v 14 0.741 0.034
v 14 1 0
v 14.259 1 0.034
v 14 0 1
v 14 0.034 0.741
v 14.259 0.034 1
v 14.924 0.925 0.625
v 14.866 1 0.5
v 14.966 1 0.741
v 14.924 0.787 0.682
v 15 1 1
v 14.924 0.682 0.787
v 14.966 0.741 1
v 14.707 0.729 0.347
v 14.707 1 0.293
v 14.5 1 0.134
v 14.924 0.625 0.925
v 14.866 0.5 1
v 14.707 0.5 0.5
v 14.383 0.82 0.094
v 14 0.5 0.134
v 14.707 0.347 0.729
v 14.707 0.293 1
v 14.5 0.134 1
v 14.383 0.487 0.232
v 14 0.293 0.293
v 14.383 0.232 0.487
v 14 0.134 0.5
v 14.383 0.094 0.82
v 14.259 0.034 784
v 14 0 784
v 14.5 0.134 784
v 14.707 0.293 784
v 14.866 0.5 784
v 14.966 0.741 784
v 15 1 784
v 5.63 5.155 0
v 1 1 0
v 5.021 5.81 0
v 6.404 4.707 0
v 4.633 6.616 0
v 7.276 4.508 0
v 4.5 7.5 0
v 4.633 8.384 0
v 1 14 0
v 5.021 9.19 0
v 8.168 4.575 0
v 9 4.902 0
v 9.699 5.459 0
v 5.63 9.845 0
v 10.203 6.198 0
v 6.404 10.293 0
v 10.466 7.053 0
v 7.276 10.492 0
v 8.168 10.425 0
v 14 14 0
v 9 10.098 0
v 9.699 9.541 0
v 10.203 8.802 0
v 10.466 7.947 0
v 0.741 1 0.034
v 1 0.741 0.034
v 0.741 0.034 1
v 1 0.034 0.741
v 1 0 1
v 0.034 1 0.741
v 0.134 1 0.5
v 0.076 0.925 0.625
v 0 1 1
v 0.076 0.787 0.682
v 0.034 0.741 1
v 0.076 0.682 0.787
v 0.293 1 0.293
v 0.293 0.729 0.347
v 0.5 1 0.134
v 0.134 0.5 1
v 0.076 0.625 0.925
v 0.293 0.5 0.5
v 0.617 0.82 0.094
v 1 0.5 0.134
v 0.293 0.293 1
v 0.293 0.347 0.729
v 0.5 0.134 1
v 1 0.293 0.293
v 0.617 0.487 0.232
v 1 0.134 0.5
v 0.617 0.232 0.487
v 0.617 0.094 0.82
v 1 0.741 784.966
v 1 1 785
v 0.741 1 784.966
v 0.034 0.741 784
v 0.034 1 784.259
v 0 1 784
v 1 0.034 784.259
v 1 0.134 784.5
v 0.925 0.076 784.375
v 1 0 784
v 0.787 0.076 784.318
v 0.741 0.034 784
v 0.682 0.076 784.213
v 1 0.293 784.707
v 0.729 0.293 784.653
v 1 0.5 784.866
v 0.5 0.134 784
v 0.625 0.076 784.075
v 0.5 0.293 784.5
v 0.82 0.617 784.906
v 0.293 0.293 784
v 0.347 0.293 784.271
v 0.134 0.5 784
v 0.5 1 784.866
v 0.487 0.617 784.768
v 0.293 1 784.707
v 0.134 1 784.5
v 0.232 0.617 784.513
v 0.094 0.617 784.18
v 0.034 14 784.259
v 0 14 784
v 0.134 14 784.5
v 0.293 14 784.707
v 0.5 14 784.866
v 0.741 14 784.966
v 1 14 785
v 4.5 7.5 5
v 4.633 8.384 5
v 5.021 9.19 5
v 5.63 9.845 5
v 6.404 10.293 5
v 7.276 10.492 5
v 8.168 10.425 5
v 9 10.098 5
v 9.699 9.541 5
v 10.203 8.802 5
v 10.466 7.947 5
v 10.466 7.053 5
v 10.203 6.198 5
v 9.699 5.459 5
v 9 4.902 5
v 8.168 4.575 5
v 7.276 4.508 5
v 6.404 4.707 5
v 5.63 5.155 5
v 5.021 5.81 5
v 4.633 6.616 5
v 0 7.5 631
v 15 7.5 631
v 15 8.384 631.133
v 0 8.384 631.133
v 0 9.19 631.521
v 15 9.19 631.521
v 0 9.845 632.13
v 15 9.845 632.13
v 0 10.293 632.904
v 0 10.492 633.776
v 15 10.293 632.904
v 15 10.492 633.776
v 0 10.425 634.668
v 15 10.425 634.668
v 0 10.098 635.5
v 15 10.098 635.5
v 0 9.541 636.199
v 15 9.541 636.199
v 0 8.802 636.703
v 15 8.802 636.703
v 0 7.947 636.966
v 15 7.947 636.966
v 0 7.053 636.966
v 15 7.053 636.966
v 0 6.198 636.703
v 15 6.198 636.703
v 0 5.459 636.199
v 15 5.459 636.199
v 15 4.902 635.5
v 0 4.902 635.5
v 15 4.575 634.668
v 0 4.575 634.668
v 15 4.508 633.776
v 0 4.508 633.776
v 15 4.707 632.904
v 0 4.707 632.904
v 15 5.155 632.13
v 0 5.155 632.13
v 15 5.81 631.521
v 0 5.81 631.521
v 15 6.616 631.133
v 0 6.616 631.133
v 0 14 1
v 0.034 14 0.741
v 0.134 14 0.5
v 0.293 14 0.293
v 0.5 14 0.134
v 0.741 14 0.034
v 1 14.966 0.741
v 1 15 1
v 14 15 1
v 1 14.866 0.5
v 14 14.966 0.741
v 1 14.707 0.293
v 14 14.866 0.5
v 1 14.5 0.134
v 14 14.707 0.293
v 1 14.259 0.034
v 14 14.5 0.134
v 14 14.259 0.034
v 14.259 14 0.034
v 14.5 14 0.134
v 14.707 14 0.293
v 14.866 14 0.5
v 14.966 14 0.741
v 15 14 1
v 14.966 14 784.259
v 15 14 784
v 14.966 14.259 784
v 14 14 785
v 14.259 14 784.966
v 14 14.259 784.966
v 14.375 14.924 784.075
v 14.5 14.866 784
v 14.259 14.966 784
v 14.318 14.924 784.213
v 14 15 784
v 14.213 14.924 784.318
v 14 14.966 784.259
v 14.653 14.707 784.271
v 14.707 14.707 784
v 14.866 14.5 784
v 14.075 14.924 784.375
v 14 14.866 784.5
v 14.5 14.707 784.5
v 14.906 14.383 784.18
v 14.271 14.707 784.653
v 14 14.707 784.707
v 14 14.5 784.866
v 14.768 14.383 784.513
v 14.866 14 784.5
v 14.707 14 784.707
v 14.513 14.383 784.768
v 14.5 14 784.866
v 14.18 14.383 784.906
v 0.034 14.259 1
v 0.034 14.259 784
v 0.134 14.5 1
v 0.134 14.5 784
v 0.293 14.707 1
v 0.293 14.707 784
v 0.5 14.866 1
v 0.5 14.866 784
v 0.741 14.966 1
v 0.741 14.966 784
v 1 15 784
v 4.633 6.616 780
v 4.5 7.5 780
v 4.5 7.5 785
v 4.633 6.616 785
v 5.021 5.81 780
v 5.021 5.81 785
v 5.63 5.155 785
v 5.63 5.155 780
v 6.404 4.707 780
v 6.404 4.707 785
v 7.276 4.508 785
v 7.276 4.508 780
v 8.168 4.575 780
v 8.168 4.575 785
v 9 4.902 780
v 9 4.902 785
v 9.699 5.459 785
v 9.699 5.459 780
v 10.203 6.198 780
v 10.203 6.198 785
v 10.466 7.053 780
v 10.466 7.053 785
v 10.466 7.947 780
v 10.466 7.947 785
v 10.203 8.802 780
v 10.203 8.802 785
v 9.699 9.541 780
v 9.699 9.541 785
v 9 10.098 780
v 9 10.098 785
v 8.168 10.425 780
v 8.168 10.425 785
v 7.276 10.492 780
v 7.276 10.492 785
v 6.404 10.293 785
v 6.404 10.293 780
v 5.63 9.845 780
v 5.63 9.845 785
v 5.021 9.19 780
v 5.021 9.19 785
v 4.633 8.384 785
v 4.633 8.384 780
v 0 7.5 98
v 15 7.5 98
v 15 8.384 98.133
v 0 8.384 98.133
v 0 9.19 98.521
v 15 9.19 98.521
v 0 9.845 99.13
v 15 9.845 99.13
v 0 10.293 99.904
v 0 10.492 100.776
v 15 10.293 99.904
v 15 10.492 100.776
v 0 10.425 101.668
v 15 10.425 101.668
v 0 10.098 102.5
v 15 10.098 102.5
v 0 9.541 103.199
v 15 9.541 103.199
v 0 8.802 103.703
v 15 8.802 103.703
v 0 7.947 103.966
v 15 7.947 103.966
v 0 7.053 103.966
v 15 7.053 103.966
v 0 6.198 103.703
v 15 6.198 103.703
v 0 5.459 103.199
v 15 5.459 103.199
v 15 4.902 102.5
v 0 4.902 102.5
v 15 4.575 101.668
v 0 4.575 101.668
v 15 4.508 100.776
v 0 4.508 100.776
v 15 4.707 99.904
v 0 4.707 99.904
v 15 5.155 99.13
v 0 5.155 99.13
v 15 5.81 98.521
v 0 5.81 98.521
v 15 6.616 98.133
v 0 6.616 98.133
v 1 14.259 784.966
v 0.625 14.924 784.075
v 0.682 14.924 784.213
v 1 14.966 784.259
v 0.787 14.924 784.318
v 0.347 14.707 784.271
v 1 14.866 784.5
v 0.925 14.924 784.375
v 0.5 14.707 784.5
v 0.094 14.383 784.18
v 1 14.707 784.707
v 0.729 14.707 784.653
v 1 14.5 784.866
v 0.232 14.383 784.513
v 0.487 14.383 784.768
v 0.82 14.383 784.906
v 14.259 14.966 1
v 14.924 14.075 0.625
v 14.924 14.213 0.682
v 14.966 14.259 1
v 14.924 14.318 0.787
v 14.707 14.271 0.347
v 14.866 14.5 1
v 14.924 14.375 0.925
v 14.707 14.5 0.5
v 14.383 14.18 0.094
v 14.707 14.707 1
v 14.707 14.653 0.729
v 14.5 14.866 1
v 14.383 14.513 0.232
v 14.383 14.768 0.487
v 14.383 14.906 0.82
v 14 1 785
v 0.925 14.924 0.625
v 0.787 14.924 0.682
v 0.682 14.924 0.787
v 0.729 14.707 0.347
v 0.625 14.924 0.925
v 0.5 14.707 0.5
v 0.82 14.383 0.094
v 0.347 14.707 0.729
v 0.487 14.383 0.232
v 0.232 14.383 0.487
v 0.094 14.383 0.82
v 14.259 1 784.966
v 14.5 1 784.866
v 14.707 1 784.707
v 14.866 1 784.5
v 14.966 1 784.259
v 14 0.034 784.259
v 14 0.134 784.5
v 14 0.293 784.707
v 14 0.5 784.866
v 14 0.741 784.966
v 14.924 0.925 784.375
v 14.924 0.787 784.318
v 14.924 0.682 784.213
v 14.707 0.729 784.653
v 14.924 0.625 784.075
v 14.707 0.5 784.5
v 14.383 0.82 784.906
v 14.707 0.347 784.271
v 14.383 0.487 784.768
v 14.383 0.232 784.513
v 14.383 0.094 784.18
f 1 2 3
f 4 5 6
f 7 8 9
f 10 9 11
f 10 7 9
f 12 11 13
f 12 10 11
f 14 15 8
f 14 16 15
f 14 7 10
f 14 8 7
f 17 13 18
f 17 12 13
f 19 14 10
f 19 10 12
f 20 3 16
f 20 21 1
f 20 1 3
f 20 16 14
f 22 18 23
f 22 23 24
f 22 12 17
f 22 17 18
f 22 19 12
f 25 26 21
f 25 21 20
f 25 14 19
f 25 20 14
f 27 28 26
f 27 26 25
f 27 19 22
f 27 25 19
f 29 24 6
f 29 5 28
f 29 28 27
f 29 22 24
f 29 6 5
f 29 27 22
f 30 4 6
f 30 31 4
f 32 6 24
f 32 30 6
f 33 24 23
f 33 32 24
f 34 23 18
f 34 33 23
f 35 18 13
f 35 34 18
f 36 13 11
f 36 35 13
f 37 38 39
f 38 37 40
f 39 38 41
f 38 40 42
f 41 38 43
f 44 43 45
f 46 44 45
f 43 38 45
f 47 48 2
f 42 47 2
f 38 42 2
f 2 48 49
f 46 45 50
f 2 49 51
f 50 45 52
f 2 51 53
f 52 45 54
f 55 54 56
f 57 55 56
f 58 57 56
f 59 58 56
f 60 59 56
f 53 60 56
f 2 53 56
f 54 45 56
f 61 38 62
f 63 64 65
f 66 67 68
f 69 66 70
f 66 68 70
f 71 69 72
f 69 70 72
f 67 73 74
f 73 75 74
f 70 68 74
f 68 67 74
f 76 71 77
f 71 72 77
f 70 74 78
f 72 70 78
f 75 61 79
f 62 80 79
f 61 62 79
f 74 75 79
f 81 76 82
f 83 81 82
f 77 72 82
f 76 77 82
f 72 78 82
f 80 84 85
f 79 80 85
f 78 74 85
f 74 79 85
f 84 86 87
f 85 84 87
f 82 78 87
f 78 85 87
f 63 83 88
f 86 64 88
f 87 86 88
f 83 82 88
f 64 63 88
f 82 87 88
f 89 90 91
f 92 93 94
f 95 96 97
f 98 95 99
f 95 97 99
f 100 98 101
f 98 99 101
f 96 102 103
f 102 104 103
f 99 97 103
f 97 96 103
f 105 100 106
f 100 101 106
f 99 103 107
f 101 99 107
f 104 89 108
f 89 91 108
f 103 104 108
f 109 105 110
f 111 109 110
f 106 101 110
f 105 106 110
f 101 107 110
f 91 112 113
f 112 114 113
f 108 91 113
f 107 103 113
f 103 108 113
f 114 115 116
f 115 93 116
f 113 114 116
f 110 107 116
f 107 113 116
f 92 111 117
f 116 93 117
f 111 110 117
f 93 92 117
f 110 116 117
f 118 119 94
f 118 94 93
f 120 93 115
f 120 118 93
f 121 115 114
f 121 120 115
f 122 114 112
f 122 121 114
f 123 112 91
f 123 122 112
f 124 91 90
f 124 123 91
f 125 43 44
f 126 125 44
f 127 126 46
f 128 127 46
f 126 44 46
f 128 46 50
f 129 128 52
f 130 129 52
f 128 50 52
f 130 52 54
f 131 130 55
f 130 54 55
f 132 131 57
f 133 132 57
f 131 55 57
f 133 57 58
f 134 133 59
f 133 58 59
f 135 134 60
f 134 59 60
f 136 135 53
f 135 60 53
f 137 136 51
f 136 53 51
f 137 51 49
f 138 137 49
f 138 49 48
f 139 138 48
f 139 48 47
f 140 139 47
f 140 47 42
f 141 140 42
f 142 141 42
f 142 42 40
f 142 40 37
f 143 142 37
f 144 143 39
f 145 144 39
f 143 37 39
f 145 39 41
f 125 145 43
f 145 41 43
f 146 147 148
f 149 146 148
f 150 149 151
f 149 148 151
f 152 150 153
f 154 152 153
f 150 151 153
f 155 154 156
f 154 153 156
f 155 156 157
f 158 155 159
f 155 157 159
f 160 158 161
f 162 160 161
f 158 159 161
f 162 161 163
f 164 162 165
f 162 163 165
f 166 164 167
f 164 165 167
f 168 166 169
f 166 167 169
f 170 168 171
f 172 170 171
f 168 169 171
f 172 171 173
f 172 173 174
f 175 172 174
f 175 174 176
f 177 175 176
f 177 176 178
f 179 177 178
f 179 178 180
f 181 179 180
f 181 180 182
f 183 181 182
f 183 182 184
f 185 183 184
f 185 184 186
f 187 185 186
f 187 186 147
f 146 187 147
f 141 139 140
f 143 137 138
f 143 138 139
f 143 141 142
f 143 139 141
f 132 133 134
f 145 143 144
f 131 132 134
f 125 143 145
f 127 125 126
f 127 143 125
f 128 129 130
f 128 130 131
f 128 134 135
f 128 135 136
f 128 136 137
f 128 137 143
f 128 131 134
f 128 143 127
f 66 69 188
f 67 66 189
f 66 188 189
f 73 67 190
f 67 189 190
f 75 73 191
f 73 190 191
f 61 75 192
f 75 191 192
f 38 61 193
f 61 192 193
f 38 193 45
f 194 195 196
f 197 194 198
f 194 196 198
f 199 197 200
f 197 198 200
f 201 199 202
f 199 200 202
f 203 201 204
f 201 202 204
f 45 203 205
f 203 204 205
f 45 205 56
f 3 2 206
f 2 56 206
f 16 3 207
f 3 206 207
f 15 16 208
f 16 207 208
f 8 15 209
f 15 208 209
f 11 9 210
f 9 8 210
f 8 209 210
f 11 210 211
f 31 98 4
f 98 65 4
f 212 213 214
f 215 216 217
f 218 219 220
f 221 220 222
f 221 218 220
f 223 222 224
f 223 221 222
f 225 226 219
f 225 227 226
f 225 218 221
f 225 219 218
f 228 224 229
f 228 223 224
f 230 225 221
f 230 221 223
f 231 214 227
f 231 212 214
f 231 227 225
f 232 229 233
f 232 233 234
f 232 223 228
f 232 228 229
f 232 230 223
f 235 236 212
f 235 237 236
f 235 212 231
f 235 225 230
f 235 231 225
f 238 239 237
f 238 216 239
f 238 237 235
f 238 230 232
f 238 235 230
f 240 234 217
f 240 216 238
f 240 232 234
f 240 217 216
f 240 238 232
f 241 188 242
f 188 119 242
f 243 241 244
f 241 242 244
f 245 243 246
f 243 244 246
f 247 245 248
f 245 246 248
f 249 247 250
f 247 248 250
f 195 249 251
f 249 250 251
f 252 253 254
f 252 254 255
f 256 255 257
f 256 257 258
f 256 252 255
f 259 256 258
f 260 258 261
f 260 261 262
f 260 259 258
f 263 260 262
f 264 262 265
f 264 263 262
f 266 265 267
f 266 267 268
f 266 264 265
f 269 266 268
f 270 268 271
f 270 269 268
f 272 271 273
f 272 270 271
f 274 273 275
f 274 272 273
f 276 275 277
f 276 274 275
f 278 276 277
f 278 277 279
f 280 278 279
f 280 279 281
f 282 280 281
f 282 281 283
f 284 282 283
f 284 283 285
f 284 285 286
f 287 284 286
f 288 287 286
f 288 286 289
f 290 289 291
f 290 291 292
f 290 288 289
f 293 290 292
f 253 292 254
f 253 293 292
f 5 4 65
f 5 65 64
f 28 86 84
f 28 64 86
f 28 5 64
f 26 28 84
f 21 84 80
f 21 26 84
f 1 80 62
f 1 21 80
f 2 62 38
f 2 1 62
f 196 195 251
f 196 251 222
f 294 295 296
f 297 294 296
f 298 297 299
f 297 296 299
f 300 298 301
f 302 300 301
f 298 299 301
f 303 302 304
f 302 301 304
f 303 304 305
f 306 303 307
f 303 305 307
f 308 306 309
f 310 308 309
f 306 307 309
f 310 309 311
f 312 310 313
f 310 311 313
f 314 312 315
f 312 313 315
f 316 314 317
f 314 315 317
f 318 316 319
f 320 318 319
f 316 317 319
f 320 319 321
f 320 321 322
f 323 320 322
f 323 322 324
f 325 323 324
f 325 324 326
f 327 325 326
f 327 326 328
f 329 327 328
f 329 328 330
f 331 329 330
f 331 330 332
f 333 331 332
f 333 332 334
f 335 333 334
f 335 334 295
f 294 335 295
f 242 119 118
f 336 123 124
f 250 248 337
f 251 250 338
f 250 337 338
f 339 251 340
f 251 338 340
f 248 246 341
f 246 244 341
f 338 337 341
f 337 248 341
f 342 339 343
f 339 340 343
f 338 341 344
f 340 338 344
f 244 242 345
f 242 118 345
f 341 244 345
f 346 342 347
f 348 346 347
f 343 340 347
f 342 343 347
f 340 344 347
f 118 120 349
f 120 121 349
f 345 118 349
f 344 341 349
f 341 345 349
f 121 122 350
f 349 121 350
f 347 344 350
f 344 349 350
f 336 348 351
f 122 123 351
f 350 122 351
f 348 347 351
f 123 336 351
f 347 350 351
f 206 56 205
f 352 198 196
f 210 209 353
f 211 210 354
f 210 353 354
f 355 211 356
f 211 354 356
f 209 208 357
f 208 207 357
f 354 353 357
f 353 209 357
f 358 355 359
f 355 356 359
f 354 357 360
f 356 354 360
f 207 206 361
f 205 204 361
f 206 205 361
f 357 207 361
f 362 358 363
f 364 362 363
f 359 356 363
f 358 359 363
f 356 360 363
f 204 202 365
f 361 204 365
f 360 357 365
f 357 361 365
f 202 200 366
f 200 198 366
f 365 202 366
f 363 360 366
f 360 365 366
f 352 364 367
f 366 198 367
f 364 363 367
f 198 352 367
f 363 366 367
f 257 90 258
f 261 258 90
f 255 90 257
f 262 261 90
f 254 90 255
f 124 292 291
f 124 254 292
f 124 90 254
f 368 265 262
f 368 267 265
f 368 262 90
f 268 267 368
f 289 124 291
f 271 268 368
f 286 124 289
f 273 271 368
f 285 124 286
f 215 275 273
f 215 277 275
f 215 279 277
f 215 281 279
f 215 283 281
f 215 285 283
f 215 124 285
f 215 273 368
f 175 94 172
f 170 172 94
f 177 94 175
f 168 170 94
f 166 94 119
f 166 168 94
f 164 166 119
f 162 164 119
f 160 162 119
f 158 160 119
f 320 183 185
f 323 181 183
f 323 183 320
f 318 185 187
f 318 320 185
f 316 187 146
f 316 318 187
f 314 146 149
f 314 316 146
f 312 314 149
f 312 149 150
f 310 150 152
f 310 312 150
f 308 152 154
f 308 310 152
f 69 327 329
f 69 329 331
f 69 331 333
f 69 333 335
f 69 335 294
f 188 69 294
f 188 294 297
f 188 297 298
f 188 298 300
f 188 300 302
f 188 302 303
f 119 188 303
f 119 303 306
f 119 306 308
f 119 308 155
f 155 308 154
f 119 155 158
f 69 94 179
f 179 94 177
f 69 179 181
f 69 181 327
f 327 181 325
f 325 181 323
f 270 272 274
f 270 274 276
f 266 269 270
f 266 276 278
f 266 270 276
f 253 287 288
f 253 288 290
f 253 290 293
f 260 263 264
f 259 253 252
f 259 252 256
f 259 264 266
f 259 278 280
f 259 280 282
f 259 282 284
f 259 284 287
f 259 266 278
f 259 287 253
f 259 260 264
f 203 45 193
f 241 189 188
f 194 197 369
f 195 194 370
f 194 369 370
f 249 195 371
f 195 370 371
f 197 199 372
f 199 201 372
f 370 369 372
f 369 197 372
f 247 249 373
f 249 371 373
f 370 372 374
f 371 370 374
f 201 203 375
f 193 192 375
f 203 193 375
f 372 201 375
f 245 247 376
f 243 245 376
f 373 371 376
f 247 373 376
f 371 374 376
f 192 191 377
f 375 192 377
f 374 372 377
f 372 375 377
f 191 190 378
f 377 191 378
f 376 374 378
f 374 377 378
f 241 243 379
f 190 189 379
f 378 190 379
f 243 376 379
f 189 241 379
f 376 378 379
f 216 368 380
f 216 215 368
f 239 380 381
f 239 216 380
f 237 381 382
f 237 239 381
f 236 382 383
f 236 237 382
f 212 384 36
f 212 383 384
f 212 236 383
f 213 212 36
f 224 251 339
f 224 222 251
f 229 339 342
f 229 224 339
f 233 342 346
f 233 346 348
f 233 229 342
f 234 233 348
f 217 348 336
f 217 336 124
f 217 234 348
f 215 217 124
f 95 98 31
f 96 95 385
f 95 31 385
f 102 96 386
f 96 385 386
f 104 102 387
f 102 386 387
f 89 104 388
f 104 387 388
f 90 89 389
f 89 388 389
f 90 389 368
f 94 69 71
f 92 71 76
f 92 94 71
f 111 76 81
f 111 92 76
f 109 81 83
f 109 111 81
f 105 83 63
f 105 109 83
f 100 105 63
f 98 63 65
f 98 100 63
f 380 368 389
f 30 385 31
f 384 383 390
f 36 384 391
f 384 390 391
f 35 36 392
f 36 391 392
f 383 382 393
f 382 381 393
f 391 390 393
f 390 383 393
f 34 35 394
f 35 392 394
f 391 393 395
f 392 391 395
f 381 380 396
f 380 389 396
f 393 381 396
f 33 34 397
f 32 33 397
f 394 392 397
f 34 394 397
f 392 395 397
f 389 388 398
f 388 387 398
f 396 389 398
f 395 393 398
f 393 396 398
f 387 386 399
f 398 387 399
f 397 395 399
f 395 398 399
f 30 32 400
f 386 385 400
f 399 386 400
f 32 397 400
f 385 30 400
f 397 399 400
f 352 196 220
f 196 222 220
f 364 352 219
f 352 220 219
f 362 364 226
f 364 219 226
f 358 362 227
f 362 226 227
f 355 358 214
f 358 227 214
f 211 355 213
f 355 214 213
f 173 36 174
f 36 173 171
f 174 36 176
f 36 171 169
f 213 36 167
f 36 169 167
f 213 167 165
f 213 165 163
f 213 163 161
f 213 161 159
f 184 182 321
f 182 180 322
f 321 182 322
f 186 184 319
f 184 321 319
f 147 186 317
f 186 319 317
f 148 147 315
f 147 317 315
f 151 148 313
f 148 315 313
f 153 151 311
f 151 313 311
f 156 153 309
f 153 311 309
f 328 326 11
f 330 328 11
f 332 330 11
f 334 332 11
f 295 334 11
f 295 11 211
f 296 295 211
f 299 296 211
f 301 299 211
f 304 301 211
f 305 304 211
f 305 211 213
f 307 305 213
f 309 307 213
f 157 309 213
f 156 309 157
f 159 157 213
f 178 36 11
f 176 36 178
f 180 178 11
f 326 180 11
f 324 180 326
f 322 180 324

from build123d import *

# Parameters (mm, degrees)
SKETCH1_W           = 15
SKETCH1_H           = 15
BOSS_EXTRUDE1_DEPTH = 785
SKETCH2_R           = 3
CUT_EXTRUDE1_DEPTH  = 5
CUT_EXTRUDE2_START  = -5
SKETCH3_R           = 3
CUT_EXTRUDE2_DEPTH  = 5
FILLET1_R           = 1
SKETCH5_R           = 3
CUT_EXTRUDE4_DEPTH  = 786.286571896


with BuildPart() as part:
    # Sketch1 → Boss-Extrude1 (new body)
    with BuildSketch(Plane.XY):
        with Locations((7.5, 7.5)):
            Rectangle(SKETCH1_W, SKETCH1_H)
    extrude(amount=BOSS_EXTRUDE1_DEPTH)

    # Sketch2 → Cut-Extrude1 (cut)
    with BuildSketch(Plane(origin=(0, 0, 0), x_dir=(-1, 0, 0), z_dir=(0, 0, -1))):
        with Locations((-7.5, 7.5)):
            Circle(SKETCH2_R)
    extrude(amount=-CUT_EXTRUDE1_DEPTH, mode=Mode.SUBTRACT)

    # Sketch3 → Cut-Extrude2 (cut)
    with BuildSketch(Plane.XY.offset(785).offset(CUT_EXTRUDE2_START)):
        with Locations(Location((7.5, 7.5, 0), (0, 0, 180))):
            Circle(SKETCH3_R)
    extrude(amount=CUT_EXTRUDE2_DEPTH, mode=Mode.SUBTRACT)

    # Fillet1
    fillet1_edges = [part.edges().sort_by_distance(p)[0] for p in [
        (0, 7.5, 785),
        (7.5, 0, 785),
        (15, 7.5, 785),
        (7.5, 0, 0),
        (0, 7.5, 0),
        (7.5, 15, 0),
        (15, 7.5, 0),
        (15, 0, 392.5),
        (0, 0, 392.5),
        (0, 15, 392.5),
        (15, 15, 392.5),
        (7.5, 15, 785),
    ]]
    fillet(fillet1_edges, radius=FILLET1_R)

    # Sketch5 → Cut-Extrude4 (cut, through all)
    with BuildSketch(Plane(origin=(15, 0, 0), x_dir=(0, 0, -1), z_dir=(1, 0, 0))):
        with Locations((-101, 7.5)):
            Circle(SKETCH5_R)
        with Locations((-634, 7.5)):
            Circle(SKETCH5_R)
    extrude(amount=-CUT_EXTRUDE4_DEPTH, mode=Mode.SUBTRACT)


solid = part.part
